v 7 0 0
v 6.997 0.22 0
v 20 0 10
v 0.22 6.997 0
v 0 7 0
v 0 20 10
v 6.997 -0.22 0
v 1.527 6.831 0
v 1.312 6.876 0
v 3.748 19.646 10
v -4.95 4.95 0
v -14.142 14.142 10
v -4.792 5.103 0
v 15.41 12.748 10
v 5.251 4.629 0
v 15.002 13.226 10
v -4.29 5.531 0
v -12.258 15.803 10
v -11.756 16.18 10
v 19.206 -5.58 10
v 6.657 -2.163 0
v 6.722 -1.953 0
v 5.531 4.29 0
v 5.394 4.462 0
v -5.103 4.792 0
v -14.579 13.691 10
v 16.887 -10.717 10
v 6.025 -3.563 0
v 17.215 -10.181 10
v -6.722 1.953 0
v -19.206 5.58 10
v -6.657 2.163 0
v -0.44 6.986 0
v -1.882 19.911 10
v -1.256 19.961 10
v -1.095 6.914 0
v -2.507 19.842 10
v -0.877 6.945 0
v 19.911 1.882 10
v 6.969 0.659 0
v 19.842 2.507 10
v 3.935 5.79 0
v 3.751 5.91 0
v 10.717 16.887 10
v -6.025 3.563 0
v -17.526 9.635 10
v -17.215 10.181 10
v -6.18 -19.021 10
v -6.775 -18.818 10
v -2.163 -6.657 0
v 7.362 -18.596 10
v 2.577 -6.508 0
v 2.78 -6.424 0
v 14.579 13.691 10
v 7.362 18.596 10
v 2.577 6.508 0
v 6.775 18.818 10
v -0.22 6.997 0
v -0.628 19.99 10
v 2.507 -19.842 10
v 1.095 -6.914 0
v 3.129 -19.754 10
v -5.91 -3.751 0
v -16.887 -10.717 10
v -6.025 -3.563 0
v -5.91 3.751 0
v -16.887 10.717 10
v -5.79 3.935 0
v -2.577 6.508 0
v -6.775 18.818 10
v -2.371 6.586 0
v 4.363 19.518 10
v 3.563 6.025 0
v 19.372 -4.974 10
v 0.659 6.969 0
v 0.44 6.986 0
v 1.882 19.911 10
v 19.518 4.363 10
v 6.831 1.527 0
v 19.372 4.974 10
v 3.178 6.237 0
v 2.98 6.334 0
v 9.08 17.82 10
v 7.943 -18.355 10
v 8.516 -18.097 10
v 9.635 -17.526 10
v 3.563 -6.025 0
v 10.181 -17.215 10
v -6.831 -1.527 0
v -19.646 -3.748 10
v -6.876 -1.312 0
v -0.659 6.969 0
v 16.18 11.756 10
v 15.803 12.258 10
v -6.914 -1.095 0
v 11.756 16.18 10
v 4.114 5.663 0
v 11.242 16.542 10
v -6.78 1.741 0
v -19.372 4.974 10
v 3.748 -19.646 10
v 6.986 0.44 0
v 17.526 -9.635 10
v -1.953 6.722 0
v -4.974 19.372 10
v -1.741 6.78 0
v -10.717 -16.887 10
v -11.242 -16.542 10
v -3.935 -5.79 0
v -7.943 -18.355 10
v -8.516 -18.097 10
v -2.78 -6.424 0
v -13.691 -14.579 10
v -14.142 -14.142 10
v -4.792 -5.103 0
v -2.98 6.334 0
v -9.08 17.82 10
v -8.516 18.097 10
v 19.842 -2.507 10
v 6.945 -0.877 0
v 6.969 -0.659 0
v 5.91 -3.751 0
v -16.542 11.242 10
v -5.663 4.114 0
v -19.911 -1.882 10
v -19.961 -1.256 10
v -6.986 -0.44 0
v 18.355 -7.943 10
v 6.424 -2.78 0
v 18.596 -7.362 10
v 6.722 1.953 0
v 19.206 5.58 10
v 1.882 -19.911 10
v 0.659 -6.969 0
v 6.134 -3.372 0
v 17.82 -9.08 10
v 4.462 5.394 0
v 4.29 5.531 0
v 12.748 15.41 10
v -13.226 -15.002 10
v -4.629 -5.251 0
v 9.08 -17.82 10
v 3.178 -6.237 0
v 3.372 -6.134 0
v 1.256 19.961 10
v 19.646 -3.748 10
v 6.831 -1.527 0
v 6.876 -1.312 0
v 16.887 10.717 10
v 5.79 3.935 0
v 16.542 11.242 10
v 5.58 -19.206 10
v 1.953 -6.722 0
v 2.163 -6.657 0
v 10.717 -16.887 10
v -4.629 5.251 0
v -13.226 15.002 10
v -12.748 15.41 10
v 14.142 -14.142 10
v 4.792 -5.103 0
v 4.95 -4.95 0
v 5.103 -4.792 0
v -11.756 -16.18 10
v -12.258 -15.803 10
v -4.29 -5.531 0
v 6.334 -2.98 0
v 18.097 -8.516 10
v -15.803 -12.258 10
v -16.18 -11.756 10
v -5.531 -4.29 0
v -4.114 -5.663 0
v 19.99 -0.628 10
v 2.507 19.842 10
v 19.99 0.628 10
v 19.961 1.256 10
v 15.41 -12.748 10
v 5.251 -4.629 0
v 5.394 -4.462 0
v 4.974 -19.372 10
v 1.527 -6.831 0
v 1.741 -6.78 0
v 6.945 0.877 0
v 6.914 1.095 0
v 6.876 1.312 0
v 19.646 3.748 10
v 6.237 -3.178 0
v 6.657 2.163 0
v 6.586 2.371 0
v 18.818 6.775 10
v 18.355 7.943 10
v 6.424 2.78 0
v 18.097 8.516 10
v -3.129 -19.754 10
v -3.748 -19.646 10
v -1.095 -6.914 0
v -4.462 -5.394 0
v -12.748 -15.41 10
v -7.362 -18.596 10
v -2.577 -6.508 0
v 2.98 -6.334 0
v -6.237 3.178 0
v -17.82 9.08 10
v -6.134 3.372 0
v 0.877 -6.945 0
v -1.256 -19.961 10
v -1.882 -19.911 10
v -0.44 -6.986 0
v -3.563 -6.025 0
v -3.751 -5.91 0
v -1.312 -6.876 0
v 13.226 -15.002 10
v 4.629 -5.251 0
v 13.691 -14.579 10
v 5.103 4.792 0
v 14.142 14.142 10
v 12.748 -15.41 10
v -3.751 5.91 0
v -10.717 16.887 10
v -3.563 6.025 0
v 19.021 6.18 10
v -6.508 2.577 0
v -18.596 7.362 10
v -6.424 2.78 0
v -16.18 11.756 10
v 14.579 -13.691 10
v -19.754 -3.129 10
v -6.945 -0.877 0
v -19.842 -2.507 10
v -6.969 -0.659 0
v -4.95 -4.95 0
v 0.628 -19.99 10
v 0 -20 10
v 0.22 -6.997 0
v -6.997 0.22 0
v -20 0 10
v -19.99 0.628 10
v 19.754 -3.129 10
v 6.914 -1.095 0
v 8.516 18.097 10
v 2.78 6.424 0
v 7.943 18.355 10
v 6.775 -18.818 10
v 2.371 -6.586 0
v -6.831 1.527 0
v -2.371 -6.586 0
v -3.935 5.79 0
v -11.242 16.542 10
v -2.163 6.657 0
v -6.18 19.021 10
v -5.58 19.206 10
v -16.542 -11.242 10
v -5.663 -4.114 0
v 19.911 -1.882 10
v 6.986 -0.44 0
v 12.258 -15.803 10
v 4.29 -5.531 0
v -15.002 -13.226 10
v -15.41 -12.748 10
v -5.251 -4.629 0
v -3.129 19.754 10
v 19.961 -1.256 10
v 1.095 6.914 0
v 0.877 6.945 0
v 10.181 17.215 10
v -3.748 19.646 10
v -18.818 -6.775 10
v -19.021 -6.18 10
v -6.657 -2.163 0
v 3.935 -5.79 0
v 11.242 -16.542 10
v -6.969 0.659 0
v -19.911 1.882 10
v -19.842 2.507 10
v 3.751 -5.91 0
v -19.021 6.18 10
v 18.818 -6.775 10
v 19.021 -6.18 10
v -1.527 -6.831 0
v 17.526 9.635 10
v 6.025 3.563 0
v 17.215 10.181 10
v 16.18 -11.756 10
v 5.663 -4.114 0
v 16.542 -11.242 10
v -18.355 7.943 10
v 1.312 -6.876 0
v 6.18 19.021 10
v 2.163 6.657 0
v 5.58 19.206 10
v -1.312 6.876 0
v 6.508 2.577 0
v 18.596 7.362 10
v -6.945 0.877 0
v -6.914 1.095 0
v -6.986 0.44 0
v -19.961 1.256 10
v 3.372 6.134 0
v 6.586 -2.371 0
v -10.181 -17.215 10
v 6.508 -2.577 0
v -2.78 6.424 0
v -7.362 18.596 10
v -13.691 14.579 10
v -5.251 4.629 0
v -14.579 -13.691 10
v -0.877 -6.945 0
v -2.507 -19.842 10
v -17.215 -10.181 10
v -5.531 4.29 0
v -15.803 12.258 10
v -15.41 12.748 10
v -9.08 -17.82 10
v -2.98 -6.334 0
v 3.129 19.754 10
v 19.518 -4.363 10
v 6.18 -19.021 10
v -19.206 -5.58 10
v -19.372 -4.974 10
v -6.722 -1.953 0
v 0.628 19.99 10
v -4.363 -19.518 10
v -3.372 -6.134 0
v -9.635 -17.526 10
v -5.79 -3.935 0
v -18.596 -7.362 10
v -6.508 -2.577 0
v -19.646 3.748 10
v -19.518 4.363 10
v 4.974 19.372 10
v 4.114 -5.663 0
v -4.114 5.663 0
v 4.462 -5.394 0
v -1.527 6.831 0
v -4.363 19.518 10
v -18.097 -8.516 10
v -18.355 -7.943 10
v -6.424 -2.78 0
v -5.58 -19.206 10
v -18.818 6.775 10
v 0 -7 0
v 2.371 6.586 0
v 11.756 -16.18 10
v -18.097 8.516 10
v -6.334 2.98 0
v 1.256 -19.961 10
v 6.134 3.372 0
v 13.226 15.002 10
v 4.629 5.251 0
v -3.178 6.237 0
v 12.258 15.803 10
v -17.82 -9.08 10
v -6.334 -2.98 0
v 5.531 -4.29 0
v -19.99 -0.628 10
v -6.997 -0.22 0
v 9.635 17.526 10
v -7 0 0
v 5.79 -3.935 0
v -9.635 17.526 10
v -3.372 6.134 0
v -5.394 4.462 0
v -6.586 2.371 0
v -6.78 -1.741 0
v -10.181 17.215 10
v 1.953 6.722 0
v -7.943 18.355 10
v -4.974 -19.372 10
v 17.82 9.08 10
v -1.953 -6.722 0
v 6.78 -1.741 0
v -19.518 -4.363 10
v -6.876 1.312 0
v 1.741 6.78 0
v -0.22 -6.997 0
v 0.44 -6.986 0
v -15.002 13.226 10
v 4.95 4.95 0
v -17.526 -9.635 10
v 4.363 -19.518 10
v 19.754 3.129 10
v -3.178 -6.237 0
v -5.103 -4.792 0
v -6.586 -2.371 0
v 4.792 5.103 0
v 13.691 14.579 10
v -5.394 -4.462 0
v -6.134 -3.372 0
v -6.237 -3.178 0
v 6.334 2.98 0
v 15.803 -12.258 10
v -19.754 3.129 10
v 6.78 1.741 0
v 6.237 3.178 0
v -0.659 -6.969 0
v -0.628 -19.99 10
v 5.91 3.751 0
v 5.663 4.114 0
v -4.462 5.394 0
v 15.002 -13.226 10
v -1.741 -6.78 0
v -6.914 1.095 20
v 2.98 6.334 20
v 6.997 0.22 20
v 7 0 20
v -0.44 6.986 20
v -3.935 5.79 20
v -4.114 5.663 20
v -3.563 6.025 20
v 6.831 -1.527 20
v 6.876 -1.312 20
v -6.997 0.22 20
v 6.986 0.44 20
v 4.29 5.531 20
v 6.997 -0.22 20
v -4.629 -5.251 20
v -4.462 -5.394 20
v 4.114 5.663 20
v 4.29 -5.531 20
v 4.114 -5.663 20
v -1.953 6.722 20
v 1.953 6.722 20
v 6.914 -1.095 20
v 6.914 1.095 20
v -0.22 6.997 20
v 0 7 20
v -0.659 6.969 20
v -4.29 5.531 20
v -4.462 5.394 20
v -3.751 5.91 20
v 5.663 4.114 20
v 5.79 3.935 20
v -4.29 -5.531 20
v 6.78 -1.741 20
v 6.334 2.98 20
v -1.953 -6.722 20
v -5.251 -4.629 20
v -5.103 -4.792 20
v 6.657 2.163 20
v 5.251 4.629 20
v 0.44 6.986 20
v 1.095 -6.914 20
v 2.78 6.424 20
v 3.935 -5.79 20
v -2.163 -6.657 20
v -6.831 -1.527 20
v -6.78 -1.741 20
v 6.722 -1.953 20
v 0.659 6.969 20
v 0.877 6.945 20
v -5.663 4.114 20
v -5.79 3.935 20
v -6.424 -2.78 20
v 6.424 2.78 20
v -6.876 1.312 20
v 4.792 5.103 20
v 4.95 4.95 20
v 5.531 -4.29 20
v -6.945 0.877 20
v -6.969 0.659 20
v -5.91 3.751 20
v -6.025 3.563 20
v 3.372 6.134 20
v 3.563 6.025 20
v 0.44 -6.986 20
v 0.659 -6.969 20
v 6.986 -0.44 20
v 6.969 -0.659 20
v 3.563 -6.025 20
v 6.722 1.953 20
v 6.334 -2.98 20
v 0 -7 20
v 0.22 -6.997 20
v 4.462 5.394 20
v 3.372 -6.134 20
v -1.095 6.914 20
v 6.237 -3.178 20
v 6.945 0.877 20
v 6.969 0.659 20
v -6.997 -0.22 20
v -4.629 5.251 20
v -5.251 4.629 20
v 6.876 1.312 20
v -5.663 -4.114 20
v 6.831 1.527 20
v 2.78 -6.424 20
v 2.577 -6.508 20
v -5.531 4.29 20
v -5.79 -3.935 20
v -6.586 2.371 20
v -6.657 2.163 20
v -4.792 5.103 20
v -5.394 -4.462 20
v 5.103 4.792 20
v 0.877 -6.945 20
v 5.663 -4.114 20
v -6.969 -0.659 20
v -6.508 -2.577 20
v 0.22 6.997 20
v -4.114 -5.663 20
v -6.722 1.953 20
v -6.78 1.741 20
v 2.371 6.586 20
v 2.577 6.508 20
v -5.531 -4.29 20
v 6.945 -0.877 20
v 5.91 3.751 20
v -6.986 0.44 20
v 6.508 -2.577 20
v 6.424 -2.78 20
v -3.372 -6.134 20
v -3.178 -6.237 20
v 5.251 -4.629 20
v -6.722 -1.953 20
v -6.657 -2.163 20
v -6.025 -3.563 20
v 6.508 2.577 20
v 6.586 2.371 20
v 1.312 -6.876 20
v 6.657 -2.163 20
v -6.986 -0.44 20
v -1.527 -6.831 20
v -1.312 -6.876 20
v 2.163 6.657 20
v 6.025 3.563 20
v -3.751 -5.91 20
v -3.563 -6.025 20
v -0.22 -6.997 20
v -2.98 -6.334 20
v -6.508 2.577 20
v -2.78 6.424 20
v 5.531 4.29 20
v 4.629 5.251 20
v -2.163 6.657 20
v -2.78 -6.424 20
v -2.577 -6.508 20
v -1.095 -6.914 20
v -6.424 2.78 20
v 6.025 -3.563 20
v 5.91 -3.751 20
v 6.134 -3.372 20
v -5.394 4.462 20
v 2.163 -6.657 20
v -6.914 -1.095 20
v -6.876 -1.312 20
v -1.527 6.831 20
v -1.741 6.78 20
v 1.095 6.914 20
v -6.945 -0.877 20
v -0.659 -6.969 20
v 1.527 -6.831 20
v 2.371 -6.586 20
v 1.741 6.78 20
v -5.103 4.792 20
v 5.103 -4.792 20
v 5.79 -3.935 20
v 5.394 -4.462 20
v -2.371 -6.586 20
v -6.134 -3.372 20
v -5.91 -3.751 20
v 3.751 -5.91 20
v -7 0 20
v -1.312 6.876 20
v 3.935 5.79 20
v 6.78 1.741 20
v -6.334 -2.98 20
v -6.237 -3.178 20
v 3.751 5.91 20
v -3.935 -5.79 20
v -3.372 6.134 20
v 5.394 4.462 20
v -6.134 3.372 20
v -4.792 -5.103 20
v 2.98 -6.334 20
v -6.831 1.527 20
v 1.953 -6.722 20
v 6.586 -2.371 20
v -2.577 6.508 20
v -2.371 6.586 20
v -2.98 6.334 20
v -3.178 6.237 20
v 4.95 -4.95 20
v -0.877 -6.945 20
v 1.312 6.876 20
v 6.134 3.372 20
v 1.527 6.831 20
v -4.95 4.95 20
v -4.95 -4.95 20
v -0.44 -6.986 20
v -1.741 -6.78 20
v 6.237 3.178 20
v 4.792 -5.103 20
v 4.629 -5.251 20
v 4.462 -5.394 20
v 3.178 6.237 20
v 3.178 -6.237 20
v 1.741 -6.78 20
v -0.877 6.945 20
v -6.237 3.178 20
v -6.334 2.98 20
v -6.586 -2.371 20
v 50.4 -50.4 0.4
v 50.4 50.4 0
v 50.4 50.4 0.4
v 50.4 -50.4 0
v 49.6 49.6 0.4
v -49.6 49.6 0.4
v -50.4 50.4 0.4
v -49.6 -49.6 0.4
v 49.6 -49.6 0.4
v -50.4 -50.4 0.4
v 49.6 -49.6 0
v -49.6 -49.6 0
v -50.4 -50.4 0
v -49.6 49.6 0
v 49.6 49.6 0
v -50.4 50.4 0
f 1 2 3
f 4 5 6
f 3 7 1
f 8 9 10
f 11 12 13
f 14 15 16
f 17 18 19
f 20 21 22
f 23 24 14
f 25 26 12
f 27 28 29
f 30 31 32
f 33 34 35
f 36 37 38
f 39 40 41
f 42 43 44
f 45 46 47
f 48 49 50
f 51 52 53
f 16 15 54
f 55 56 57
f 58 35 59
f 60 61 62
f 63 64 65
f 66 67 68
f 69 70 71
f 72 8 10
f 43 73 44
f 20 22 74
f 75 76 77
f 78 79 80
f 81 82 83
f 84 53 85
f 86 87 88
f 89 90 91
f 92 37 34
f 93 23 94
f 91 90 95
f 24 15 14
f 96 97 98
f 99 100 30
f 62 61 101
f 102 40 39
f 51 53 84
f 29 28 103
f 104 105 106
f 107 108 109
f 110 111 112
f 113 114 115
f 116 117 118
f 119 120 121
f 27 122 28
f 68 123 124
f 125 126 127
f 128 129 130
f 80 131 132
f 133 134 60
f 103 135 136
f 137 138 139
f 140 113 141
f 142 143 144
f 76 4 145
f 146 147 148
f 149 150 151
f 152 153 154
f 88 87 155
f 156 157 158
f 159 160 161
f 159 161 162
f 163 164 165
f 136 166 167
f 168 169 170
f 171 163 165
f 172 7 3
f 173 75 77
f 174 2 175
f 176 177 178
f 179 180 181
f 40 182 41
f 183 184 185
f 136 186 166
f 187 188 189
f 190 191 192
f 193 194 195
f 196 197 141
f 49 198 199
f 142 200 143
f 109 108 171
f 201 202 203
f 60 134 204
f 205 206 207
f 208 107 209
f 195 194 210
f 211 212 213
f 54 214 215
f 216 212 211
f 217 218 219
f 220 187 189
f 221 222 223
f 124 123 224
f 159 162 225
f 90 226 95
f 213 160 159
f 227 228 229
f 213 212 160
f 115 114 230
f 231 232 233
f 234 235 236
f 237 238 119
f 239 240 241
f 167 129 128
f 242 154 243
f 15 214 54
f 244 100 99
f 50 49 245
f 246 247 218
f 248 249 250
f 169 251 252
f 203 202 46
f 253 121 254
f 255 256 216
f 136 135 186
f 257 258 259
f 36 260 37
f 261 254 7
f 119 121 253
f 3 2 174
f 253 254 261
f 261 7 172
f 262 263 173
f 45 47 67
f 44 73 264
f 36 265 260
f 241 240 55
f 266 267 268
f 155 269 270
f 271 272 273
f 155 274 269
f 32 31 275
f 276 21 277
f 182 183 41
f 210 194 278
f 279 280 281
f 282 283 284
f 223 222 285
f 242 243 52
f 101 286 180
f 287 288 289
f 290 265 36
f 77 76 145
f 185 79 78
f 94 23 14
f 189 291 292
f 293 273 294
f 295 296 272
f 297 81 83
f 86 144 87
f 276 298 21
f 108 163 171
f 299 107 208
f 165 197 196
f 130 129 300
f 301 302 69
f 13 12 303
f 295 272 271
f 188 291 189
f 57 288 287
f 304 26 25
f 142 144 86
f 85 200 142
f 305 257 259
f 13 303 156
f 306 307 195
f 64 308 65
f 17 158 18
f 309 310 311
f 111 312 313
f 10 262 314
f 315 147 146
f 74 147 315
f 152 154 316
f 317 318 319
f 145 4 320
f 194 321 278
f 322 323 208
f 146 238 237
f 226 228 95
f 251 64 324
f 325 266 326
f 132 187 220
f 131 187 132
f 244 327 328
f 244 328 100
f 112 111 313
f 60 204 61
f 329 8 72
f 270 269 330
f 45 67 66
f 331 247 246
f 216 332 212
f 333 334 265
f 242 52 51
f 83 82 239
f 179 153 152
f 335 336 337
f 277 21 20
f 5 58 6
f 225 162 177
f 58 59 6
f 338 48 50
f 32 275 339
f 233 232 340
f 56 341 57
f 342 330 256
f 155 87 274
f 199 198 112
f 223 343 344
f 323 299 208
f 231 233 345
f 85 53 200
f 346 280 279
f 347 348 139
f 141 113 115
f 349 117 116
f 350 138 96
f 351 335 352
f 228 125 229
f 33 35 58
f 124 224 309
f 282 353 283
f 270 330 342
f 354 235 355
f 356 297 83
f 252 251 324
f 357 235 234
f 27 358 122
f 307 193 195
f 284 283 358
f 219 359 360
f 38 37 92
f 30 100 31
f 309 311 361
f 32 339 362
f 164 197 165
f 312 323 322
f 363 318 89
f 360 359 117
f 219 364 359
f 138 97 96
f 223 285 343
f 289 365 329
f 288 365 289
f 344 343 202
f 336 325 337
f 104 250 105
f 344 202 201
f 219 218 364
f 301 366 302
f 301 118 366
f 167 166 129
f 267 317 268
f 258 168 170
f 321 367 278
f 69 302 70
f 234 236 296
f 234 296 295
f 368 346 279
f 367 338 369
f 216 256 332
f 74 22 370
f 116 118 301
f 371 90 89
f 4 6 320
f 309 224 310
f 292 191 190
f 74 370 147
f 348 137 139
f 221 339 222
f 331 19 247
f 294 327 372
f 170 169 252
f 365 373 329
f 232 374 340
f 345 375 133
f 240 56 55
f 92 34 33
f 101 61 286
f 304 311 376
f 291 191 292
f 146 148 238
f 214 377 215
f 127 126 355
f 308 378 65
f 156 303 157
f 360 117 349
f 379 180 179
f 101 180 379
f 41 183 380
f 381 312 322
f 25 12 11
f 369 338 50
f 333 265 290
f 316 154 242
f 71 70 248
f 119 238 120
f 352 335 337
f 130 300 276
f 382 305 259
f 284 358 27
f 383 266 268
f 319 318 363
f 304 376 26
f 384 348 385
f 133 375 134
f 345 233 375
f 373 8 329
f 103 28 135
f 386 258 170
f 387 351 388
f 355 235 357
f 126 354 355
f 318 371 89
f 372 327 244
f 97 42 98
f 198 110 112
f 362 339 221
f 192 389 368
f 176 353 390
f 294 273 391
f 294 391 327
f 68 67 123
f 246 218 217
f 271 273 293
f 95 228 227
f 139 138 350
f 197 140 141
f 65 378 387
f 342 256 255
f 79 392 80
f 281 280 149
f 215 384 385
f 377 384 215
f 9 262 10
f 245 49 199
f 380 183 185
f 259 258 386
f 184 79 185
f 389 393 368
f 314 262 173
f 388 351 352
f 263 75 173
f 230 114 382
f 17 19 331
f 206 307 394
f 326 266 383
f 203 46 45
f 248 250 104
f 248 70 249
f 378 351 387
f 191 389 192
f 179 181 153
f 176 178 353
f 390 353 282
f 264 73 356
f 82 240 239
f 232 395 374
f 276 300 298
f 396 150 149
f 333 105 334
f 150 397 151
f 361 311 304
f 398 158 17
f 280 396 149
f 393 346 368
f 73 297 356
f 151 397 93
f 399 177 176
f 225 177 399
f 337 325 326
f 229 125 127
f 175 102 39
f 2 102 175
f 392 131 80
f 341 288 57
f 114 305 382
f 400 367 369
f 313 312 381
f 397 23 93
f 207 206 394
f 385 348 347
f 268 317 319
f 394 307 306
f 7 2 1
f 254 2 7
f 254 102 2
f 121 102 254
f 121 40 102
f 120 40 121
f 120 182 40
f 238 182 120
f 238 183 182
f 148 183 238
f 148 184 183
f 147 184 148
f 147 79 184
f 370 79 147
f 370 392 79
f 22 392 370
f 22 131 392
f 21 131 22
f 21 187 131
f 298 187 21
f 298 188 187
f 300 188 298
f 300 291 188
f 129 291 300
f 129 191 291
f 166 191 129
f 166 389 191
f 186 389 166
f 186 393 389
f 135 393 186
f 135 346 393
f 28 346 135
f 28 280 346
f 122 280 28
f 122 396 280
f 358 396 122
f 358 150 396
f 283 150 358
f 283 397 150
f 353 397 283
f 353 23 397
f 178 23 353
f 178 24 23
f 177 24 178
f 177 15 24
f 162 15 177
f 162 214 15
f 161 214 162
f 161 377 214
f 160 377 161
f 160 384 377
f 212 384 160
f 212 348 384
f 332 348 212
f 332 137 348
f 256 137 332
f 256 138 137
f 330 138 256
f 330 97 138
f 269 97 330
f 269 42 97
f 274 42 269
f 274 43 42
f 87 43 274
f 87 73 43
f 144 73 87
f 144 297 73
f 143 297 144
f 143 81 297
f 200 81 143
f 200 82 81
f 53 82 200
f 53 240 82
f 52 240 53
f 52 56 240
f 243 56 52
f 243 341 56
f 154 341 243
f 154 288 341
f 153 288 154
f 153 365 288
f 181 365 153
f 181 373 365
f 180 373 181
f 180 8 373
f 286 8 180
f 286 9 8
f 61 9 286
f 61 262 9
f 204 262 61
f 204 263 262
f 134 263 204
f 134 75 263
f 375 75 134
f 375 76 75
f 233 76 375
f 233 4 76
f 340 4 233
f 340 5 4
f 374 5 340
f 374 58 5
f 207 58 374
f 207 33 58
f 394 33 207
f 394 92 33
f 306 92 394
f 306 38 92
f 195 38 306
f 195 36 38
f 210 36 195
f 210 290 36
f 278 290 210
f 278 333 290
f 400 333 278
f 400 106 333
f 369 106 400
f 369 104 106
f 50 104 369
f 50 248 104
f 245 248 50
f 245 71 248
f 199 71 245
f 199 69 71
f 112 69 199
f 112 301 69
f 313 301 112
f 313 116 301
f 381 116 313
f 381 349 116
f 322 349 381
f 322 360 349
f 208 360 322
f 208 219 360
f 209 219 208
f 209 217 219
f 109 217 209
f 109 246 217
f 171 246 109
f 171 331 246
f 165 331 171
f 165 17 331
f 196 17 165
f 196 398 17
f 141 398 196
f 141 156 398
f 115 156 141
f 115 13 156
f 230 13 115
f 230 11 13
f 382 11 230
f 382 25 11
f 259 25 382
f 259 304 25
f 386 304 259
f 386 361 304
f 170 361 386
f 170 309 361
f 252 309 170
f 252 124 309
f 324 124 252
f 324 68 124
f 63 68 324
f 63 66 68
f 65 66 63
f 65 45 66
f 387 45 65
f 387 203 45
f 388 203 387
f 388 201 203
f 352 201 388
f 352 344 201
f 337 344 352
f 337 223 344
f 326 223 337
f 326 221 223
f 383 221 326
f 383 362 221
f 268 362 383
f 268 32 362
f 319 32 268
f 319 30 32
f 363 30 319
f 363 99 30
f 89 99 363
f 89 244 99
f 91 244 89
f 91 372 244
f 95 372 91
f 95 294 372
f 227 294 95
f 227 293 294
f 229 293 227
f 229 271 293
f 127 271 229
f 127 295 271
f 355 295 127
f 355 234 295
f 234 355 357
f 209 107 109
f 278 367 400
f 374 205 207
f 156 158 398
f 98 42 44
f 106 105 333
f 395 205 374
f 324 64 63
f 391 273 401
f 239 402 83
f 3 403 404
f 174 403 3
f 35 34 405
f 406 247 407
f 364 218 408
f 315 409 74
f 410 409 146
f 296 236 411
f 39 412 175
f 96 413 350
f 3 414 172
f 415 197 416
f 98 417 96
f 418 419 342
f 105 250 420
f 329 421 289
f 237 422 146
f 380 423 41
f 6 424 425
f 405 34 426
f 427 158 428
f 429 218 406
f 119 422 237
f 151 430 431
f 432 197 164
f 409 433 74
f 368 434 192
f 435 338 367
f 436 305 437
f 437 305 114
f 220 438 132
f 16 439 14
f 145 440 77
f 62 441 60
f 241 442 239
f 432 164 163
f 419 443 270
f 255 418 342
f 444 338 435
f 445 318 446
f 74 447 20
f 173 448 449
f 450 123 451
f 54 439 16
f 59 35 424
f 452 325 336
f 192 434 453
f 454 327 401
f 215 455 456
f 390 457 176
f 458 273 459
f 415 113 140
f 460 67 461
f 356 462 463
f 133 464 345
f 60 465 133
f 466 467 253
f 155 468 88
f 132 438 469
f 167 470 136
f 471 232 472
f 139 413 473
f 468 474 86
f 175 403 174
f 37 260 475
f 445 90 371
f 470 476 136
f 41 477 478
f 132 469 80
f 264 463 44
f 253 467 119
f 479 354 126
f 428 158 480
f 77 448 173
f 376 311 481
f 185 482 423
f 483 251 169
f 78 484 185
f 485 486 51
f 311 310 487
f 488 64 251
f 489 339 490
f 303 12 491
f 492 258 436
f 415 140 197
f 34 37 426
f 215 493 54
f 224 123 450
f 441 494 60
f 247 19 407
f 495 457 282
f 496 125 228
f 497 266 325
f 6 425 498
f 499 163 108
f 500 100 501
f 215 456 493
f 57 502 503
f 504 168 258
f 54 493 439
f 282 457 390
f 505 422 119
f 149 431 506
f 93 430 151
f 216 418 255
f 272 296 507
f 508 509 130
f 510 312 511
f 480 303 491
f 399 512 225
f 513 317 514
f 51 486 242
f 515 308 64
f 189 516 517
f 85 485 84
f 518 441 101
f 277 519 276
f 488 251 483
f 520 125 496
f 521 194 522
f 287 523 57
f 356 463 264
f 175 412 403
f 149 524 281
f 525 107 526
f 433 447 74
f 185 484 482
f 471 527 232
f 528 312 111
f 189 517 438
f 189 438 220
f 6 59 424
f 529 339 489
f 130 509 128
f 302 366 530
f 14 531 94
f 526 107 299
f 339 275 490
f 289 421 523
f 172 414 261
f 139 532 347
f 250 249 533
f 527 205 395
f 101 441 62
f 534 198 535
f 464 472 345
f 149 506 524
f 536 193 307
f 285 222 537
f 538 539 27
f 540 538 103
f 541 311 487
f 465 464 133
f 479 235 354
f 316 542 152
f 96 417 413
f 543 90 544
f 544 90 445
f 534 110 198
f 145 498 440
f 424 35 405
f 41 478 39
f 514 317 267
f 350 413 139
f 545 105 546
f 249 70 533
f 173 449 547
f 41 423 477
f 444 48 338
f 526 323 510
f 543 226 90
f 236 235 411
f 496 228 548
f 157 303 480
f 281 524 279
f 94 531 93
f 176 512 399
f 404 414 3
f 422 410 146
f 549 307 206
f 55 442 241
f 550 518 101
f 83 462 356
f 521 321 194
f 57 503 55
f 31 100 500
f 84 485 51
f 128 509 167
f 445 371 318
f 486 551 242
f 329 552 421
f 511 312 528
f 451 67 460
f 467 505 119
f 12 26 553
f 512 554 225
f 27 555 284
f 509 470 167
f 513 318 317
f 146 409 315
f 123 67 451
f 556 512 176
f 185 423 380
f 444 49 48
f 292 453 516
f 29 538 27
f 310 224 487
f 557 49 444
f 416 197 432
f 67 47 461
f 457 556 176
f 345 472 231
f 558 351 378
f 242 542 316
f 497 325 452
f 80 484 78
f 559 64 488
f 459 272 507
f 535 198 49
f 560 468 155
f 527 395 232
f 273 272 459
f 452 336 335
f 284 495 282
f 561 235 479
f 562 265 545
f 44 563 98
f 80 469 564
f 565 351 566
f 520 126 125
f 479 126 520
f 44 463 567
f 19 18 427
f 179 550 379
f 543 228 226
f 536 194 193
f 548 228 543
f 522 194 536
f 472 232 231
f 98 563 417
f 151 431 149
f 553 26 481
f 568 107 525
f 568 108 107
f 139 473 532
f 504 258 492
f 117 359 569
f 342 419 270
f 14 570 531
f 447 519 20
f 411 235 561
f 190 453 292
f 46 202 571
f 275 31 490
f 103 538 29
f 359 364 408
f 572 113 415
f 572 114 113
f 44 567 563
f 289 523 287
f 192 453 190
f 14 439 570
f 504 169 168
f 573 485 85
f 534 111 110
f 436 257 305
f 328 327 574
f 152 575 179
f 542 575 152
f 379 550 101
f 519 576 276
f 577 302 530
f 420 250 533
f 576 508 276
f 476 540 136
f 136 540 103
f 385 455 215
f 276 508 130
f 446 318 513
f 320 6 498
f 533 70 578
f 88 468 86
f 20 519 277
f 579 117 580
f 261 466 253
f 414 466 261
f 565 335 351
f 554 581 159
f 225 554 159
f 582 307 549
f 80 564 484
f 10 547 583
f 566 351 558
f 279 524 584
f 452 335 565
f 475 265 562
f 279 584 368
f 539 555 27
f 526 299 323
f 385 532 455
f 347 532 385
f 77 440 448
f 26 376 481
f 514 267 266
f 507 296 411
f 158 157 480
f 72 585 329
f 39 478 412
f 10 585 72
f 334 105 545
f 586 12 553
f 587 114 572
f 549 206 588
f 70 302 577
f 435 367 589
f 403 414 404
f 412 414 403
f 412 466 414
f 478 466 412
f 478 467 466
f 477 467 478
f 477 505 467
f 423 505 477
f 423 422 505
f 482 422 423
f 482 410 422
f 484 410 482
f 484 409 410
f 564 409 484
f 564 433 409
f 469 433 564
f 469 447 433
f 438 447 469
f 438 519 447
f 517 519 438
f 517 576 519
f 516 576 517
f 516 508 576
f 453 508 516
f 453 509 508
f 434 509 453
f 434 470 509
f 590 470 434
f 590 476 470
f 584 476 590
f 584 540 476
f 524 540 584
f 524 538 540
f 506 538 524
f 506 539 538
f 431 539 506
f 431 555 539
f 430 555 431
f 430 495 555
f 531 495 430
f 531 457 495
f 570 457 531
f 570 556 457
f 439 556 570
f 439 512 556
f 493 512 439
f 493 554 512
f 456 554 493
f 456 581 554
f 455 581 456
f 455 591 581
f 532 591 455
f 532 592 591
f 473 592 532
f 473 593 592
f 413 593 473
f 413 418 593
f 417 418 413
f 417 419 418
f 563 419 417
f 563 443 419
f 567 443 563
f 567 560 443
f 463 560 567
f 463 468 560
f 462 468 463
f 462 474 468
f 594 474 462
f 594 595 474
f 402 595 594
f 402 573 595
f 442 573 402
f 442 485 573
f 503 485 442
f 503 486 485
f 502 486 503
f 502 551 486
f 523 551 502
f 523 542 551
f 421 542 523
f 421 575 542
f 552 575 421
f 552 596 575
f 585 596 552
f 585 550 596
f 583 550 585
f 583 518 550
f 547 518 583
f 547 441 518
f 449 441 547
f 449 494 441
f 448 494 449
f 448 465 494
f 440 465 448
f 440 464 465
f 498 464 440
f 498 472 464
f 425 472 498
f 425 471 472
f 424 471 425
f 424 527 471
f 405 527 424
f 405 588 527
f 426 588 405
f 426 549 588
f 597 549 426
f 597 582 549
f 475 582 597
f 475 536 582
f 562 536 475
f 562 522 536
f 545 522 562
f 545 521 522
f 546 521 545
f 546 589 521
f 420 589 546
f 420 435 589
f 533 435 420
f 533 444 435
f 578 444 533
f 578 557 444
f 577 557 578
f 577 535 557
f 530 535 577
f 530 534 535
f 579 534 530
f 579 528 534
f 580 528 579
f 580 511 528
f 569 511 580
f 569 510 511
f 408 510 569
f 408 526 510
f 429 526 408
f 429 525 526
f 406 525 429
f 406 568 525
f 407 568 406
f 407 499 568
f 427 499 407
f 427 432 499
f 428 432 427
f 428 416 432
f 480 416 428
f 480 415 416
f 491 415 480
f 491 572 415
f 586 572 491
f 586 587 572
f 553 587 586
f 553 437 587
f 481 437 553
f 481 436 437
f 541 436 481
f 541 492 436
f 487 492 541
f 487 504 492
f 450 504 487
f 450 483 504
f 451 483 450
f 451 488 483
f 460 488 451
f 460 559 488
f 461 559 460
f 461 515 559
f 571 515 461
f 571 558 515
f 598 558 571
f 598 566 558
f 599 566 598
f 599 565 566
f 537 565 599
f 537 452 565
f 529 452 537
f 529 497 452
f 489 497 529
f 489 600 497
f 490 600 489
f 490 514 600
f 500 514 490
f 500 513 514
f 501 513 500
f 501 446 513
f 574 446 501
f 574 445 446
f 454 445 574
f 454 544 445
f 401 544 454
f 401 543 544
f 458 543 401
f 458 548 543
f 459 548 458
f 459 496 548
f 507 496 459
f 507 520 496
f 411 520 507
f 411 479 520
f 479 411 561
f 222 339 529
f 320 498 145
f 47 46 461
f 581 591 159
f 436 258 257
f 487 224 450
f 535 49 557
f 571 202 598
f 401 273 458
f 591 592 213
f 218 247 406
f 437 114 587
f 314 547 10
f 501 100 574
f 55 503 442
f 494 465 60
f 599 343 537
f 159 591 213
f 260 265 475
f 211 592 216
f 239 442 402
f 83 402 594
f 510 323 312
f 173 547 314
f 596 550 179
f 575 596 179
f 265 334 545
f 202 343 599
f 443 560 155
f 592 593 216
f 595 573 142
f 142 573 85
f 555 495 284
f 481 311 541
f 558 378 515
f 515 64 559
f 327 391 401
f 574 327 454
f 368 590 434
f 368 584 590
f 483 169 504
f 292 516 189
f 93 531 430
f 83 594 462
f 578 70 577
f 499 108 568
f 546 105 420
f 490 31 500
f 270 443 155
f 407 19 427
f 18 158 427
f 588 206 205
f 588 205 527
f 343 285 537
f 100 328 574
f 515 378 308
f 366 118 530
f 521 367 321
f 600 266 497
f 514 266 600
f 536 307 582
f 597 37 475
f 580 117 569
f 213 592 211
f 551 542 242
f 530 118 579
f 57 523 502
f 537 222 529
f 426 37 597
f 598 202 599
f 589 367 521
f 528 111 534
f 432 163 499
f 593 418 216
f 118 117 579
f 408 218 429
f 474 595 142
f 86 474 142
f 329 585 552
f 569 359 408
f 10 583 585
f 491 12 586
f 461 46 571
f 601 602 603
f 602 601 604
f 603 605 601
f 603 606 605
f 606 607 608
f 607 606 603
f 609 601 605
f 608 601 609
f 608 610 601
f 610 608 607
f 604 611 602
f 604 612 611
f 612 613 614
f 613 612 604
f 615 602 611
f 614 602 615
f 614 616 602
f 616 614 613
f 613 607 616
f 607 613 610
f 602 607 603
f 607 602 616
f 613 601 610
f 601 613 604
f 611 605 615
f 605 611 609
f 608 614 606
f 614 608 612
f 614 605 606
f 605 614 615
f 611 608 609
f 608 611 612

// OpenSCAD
// file: calibration_square.scad
width=100;
border_width=0.4;
border_height=0.4;


module calibration_square()  {
translate([0,0,border_height/2])
difference() {
		cube(size=[width+border_width*2,width+border_width*2,border_height], center=true);	
		cube(size=[width-border_width*2,width-border_width*2,border_height*2], center=true);
}
}

calibration_square();
// main file
$fn=200;

use <calibration_square.scad>

cylinder_width1=7;
cylinder_width2=20;
cylinder_height=20;

module trunccylinder() {
	union()
	{
		cylinder(h = cylinder_height/2, r1 = cylinder_width1, r2 = cylinder_width2);
		translate([0,0,cylinder_height/2])
		cylinder(h = cylinder_height/2, r1 = cylinder_width2, r2 = cylinder_width1);

	}
}
 

	trunccylinder();

calibration_square();
